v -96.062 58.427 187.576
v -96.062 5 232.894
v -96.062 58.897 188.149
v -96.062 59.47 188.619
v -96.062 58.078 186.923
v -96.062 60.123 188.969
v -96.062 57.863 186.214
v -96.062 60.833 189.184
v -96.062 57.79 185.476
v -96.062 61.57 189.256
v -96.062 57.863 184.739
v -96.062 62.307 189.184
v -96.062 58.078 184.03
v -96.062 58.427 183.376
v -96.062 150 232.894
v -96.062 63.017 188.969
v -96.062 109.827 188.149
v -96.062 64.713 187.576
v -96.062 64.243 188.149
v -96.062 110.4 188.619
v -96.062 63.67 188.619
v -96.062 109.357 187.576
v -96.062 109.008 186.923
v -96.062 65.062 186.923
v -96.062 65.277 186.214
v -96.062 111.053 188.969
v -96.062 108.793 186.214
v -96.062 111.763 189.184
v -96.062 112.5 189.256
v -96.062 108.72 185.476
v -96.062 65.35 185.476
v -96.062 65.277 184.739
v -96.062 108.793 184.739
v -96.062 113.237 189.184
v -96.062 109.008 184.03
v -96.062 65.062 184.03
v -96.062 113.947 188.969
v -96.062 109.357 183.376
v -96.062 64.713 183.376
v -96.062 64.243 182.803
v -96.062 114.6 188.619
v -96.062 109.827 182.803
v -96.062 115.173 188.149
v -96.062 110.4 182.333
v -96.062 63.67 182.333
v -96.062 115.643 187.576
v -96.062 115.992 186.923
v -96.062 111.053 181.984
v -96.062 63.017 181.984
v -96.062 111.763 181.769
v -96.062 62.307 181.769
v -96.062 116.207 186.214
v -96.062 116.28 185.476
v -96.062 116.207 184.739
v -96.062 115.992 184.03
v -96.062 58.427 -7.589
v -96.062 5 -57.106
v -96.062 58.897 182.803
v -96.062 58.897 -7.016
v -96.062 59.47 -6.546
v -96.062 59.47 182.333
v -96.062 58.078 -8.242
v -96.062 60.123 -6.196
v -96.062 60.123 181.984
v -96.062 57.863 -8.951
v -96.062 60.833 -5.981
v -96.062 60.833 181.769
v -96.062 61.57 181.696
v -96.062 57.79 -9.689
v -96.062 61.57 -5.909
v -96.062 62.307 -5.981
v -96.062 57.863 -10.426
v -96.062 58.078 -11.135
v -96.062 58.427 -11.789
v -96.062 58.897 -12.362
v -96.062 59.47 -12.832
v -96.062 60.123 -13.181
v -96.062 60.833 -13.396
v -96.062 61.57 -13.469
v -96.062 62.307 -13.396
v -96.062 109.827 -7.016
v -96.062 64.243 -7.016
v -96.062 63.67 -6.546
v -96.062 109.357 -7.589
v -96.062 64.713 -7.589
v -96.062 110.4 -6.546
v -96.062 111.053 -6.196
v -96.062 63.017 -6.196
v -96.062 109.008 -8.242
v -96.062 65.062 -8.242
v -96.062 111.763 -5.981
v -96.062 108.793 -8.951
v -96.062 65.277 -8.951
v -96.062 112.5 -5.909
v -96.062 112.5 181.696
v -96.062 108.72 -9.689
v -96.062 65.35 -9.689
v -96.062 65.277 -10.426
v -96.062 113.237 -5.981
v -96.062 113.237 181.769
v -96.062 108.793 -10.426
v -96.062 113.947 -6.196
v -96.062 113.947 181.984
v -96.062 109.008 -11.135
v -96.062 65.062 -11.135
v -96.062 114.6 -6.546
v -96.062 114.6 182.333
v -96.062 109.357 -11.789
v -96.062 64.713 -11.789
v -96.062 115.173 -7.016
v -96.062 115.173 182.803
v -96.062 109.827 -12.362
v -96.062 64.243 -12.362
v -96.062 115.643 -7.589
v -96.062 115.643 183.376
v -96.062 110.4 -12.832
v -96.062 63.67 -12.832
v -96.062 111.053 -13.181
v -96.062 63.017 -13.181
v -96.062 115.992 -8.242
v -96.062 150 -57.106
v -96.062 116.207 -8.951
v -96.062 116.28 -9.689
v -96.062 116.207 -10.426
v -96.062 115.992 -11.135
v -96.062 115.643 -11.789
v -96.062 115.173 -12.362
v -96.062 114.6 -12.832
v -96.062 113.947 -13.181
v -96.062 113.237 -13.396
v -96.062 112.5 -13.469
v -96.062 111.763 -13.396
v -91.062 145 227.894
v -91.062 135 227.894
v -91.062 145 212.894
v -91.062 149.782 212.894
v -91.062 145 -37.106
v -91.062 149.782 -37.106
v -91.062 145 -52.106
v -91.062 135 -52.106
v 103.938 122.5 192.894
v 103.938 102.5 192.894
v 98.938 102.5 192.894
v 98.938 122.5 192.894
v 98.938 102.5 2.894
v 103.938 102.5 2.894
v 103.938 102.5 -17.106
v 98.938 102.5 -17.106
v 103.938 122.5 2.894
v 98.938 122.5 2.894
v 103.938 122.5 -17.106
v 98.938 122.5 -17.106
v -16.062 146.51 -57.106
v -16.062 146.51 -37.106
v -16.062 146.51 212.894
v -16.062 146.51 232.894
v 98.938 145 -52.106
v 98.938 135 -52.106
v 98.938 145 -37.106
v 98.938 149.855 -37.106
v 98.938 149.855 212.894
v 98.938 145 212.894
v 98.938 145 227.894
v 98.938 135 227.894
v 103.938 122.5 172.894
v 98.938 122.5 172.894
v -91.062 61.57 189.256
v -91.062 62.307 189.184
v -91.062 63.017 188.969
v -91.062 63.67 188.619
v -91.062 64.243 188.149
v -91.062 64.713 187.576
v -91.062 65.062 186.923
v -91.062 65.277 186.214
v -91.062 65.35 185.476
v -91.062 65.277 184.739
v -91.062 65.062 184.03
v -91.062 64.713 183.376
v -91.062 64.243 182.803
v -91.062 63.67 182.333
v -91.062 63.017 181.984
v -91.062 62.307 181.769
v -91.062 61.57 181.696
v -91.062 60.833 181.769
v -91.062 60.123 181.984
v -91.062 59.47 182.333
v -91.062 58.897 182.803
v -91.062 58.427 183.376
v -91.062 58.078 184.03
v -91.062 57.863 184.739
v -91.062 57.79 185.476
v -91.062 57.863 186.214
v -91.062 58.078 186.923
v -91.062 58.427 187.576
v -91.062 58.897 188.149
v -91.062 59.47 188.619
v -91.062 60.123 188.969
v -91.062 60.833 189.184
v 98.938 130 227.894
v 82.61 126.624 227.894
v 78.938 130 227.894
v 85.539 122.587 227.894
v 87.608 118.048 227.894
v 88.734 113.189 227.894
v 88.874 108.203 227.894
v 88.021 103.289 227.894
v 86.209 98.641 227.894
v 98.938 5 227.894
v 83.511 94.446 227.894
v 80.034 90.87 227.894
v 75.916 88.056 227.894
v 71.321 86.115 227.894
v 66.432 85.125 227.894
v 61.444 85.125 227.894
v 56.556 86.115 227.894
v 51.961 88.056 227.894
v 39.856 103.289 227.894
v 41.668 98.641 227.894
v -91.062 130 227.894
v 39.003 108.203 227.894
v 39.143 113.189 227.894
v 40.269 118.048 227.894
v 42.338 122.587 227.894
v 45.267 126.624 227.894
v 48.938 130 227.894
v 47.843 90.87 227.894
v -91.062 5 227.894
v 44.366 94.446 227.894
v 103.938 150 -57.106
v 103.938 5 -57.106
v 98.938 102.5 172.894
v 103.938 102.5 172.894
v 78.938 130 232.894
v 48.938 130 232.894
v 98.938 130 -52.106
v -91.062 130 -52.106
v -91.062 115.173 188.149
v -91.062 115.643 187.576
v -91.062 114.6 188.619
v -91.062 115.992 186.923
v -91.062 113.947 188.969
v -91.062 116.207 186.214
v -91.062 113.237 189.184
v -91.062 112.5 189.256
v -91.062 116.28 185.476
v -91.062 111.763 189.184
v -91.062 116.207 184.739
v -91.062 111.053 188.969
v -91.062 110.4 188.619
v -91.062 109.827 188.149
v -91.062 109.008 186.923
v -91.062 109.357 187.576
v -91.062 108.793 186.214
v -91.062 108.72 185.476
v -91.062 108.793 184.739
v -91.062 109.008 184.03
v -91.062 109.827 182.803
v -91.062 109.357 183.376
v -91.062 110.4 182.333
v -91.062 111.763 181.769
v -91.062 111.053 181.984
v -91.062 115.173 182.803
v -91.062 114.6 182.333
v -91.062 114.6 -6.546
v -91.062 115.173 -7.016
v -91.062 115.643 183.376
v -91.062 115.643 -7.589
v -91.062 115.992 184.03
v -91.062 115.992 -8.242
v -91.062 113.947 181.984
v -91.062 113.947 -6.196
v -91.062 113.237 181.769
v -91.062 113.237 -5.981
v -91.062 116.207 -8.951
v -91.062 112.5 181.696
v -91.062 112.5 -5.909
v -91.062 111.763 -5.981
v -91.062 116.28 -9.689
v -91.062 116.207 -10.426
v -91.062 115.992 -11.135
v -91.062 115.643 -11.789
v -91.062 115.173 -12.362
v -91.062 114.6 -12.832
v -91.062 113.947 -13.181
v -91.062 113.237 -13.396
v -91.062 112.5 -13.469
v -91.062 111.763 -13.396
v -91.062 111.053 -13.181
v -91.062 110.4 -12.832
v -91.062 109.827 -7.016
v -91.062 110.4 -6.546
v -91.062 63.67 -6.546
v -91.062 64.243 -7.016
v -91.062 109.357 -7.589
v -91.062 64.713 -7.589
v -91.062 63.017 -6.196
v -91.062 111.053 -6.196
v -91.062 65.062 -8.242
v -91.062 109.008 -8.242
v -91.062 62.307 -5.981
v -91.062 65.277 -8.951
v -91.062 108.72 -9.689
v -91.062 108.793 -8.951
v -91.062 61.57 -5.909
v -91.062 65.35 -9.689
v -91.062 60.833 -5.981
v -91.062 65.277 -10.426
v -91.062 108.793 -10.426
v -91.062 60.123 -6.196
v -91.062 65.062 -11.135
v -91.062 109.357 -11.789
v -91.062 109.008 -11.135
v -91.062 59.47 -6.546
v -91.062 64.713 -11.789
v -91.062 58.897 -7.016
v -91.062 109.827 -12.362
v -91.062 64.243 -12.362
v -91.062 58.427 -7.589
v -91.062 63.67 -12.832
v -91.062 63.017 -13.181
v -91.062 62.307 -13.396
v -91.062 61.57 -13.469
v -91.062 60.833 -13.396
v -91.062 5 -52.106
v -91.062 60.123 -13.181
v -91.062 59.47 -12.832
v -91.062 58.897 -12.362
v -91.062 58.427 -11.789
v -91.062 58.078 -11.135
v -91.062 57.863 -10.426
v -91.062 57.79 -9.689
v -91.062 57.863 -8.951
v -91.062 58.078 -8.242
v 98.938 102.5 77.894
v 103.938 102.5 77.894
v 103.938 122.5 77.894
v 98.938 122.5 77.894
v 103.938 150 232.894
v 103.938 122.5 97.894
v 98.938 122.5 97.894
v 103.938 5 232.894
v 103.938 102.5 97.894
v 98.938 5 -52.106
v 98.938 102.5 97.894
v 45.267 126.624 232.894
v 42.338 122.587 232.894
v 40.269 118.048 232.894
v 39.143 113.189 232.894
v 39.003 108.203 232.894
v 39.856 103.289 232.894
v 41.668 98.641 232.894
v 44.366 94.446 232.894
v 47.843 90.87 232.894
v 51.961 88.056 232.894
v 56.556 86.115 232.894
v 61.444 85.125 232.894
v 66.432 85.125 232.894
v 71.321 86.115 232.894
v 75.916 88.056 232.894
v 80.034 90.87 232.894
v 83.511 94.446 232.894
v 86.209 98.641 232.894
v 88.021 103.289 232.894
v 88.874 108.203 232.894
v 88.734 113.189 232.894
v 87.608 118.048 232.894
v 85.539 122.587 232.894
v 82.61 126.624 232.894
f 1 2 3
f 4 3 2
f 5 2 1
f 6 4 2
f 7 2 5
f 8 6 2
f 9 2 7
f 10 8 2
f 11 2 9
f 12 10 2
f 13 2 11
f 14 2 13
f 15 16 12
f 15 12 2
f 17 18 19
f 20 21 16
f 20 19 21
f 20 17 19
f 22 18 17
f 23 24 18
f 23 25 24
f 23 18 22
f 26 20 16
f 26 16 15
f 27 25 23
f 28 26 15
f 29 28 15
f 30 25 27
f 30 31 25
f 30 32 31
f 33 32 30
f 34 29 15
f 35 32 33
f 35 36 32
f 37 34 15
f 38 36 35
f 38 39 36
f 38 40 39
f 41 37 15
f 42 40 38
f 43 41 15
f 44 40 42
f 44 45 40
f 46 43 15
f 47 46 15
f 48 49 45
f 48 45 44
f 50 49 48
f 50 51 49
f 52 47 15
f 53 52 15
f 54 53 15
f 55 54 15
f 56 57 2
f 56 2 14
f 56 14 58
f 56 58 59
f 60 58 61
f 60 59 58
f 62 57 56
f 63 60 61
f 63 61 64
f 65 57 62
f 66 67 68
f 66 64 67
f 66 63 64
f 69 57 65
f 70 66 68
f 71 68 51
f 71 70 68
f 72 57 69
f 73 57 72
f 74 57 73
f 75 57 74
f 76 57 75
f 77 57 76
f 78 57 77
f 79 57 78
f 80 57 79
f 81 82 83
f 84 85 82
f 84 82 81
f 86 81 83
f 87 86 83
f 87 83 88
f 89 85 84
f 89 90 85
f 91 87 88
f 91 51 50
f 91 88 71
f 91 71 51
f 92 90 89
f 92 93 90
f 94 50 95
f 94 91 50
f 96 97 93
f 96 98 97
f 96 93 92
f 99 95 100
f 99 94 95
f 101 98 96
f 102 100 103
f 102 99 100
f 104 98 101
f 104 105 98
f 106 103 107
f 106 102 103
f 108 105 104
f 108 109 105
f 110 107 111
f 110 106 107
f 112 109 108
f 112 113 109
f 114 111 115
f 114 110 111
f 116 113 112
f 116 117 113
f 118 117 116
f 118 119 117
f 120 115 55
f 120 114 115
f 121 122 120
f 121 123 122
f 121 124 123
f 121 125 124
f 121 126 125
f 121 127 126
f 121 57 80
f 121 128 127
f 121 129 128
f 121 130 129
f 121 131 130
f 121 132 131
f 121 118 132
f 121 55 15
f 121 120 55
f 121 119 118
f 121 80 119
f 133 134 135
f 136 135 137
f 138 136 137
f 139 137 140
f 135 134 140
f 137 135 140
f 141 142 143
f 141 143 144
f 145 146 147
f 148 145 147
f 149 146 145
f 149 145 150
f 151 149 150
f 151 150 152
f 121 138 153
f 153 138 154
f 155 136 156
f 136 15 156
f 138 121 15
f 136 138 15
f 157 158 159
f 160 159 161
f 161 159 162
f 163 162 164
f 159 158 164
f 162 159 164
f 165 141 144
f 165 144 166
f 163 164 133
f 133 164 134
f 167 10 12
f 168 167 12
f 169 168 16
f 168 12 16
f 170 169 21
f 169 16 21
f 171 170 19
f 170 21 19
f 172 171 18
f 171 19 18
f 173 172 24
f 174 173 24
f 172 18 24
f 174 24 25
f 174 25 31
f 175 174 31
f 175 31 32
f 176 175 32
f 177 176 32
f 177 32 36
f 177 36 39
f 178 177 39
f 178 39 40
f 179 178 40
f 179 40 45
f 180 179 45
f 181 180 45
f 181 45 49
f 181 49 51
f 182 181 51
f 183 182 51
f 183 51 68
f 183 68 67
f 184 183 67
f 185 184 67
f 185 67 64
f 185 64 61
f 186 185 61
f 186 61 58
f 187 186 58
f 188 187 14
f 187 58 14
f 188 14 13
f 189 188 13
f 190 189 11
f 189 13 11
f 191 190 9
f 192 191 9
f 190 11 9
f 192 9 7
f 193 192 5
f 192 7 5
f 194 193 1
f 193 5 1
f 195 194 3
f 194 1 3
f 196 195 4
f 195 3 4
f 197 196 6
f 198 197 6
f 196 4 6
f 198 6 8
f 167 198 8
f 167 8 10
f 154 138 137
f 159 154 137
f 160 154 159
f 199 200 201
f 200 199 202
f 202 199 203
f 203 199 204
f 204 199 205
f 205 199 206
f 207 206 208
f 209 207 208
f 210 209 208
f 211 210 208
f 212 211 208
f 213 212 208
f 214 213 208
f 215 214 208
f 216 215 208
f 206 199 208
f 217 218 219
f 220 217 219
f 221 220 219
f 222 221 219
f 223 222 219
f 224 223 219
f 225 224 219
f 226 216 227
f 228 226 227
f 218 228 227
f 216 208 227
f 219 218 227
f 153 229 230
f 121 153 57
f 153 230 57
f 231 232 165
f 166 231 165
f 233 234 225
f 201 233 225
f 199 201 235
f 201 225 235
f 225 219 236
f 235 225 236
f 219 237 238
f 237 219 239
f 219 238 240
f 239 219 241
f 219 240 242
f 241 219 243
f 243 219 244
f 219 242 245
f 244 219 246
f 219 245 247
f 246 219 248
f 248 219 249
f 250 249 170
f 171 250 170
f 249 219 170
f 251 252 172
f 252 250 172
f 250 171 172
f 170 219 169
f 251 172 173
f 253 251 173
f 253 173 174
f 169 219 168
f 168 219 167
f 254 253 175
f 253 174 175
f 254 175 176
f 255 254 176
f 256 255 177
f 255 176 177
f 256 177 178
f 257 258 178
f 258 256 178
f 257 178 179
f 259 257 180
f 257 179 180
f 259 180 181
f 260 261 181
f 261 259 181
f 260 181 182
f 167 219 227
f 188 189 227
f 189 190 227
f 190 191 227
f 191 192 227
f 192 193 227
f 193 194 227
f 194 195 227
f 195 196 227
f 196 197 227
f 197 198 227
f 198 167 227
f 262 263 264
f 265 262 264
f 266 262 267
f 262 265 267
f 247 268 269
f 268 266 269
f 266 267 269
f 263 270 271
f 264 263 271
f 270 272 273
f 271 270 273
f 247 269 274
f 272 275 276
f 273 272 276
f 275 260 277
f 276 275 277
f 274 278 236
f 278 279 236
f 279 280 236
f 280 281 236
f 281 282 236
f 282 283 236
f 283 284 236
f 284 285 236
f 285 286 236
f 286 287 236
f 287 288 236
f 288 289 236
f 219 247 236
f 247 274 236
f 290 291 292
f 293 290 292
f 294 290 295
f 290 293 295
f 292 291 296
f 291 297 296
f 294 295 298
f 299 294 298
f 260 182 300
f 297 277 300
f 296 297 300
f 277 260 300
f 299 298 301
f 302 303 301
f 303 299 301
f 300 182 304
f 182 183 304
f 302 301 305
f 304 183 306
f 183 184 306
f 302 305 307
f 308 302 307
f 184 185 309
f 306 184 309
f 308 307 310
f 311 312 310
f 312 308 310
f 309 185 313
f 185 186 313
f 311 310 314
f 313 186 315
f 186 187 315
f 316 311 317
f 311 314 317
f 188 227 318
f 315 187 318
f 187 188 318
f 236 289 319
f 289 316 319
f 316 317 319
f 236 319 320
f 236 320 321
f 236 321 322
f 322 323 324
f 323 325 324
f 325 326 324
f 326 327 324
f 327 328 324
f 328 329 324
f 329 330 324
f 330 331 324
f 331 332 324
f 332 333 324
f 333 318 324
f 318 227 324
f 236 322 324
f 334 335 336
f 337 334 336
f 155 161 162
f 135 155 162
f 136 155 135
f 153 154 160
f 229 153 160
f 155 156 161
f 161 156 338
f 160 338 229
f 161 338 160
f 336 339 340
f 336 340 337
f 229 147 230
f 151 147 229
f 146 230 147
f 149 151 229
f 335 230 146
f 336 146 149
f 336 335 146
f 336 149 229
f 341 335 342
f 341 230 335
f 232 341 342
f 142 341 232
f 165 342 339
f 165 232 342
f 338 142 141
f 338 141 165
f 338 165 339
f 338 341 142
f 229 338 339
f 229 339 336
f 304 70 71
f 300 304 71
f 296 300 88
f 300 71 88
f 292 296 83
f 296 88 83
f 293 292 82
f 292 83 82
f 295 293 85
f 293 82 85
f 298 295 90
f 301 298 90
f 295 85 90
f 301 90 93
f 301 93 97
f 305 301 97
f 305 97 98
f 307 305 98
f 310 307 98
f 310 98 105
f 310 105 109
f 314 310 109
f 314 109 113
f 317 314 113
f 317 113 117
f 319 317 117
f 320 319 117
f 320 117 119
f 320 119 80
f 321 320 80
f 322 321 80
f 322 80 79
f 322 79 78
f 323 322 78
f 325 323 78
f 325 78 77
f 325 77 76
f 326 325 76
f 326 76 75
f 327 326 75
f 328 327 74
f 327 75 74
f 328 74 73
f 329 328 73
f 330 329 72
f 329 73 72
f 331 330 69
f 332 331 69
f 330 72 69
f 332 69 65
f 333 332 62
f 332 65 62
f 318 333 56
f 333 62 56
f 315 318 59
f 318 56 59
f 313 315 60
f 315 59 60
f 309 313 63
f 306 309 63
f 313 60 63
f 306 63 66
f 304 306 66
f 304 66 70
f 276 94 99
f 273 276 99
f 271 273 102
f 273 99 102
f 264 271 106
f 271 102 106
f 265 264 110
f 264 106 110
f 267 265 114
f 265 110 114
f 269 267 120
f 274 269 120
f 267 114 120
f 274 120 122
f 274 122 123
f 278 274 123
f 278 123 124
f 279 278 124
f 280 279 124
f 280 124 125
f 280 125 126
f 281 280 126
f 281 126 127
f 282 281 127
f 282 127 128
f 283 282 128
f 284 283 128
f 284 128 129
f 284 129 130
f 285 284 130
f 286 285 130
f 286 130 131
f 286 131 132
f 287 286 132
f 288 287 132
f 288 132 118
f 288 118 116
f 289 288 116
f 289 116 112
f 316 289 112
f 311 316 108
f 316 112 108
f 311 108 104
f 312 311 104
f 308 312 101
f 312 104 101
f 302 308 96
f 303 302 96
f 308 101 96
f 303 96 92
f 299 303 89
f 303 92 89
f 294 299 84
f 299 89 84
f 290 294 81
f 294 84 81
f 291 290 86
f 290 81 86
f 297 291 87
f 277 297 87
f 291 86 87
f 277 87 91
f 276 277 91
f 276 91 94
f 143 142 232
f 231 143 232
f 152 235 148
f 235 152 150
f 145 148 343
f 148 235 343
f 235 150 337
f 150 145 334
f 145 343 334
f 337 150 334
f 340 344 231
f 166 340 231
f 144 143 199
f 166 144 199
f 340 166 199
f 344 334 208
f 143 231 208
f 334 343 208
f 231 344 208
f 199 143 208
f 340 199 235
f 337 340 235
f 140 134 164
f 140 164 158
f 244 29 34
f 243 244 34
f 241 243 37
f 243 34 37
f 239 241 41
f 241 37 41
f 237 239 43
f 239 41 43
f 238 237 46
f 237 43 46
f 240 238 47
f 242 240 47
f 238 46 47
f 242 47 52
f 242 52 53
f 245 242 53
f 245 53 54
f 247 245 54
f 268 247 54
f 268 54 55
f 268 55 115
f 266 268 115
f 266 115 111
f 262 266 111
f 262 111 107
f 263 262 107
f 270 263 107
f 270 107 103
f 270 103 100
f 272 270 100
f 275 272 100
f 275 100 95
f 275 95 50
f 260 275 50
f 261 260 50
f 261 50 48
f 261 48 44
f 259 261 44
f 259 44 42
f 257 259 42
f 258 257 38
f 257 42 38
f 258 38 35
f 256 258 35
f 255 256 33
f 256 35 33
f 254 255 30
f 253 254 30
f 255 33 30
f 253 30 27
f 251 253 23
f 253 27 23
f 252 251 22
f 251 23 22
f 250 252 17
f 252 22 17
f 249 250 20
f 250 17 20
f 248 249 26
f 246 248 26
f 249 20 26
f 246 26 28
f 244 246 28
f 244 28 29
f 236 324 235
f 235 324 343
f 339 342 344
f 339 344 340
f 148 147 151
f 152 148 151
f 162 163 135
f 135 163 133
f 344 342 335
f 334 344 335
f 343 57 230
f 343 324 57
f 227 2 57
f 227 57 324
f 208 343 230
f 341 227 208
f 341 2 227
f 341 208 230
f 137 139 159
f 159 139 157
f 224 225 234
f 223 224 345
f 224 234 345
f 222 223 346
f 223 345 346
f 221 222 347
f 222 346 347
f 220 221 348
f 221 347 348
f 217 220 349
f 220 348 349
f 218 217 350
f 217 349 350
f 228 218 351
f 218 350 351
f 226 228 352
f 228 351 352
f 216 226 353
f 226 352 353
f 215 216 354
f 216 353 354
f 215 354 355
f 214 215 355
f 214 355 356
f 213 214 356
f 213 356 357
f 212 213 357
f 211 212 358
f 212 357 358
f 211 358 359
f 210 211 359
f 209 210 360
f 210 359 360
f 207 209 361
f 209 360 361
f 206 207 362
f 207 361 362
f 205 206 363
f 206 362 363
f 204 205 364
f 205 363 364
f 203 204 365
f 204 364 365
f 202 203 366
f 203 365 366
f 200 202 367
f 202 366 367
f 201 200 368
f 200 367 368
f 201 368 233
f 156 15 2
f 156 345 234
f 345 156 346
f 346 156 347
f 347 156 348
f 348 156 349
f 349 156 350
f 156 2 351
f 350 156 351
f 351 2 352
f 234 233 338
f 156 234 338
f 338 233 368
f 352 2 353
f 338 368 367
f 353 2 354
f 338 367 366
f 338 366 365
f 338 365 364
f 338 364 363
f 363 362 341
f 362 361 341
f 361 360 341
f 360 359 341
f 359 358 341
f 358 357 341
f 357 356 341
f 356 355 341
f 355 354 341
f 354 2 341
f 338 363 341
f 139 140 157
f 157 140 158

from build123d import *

# Parameters (mm, degrees)
SKETCH1_W            = 200
SKETCH1_H            = 290
BOSS_EXTRUDE2_DEPTH  = 10
BOSS_EXTRUDE4_DEPTH  = 140
SKETCH5_W            = 20
SKETCH5_H            = 20
CUT_EXTRUDE1_DEPTH   = 10
SKETCH6_R            = 3.78
CUT_EXTRUDE2_DEPTH   = 10
SKETCH7_R            = 25
CUT_EXTRUDE3_DEPTH   = 10
SKETCH8_W            = 190
SKETCH8_H            = 280
CUT_EXTRUDE4_DEPTH   = 10
SKETCH9_W            = 211.457715155
SKETCH9_H            = 301.376650104
CUT_EXTRUDE5_DEPTH   = 5
SKETCH10_W           = 200
SKETCH10_H           = 5
BOSS_EXTRUDE7_DEPTH  = 15
SKETCH12_W           = 200
SKETCH12_H           = 5
BOSS_EXTRUDE8_DEPTH  = 15
SKETCH13_W           = 290
SKETCH13_H           = 5
BOSS_EXTRUDE14_DEPTH = 190
CUT_EXTRUDE6_DEPTH   = 300


with BuildPart() as part:
    # Sketch1 → Boss-Extrude2 (new body)
    with BuildSketch(Plane(origin=(0, 0, 0), x_dir=(1, 0, 0), z_dir=(0, 1, 0))):
        with Locations((3.938356164, -87.893835616)):
            Rectangle(SKETCH1_W, SKETCH1_H)
    extrude(amount=BOSS_EXTRUDE2_DEPTH)

    # Sketch2 → Boss-Extrude4 (add)
    with BuildSketch(Plane(origin=(0, 10, 0), x_dir=(1, 0, 0), z_dir=(0, 1, 0))):
        Polygon((-96.061643836, 57.106164384), (-96.061643836, -87.893835616), (-91.061643836, -87.893835616), (-91.061643836, 52.106164384), (3.938356164, 52.106164384), (3.938356164, 57.106164384), align=None)
        Polygon((103.938356164, 57.106164384), (3.938356164, 57.106164384), (3.938356164, 52.106164384), (98.938356164, 52.106164384), (98.938356164, -87.893835616), (103.938356164, -87.893835616), align=None)
        Polygon((3.938356164, -227.893835616), (3.938356164, -232.893835616), (103.938356164, -232.893835616), (103.938356164, -87.893835616), (98.938356164, -87.893835616), (98.938356164, -227.893835616), align=None)
        Polygon((-91.061643836, -87.893835616), (-96.061643836, -87.893835616), (-96.061643836, -232.893835616), (3.938356164, -232.893835616), (3.938356164, -227.893835616), (-91.061643836, -227.893835616), align=None)
    extrude(amount=BOSS_EXTRUDE4_DEPTH)

    # Sketch5 → Cut-Extrude1 (cut)
    with BuildSketch(Plane(origin=(103.938356164, 0, 0), x_dir=(0, 0, -1), z_dir=(1, 0, 0))):
        with Locations((-182.893835616, 112.5)):
            Rectangle(SKETCH5_W, SKETCH5_H)
        with Locations((-87.893835616, 112.5)):
            Rectangle(SKETCH5_W, SKETCH5_H)
        with Locations((7.106164384, 112.5)):
            Rectangle(SKETCH5_W, SKETCH5_H)
    extrude(amount=-CUT_EXTRUDE1_DEPTH, mode=Mode.SUBTRACT)

    # Sketch6 → Cut-Extrude2 (cut)
    with BuildSketch(Plane.ZY.offset(96.061643836)):
        with Locations((185.476335616, 112.5)):
            Circle(SKETCH6_R)
        with Locations((-9.688664384, 112.5)):
            Circle(SKETCH6_R)
        with Locations((185.476335616, 61.57)):
            Circle(SKETCH6_R)
        with Locations((-9.688664384, 61.57)):
            Circle(SKETCH6_R)
    extrude(amount=-CUT_EXTRUDE2_DEPTH, mode=Mode.SUBTRACT)

    # Sketch7 → Cut-Extrude3 (cut)
    with BuildSketch(Plane.XY.offset(232.893835616)):
        with Locations((63.938356164, 110)):
            Circle(SKETCH7_R)
    extrude(amount=-CUT_EXTRUDE3_DEPTH, mode=Mode.SUBTRACT)

    # Sketch8 → Cut-Extrude4 (cut)
    with BuildSketch(Plane(origin=(0, 10, 0), x_dir=(1, 0, 0), z_dir=(0, 1, 0))):
        with Locations((3.938356164, -87.893835616)):
            Rectangle(SKETCH8_W, SKETCH8_H)
    extrude(amount=-CUT_EXTRUDE4_DEPTH, mode=Mode.SUBTRACT)

    # Sketch9 → Cut-Extrude5 (cut)
    with BuildSketch(Plane.XZ):
        with Locations((3.40694666, 89.005470801)):
            Rectangle(SKETCH9_W, SKETCH9_H)
    extrude(amount=-CUT_EXTRUDE5_DEPTH, mode=Mode.SUBTRACT)

    # Sketch10 → Boss-Extrude7 (add)
    with BuildSketch(Plane(origin=(0, 0, 227.893835616), x_dir=(-1, 0, 0), z_dir=(0, 0, -1))):
        with Locations((-3.938356164, 147.5)):
            Rectangle(SKETCH10_W, SKETCH10_H)
    extrude(amount=BOSS_EXTRUDE7_DEPTH)

    # Sketch12 → Boss-Extrude8 (add)
    with BuildSketch(Plane.XY.offset(-52.106164384)):
        with Locations((3.938356164, 147.5)):
            Rectangle(SKETCH12_W, SKETCH12_H)
    extrude(amount=BOSS_EXTRUDE8_DEPTH)

    # Sketch13 → Boss-Extrude14 (add)
    with BuildSketch(Plane(origin=(-91.061643836, 0, 0), x_dir=(0, 0, -1), z_dir=(1, 0, 0))):
        with Locations((-87.893835616, 132.5)):
            Rectangle(SKETCH13_W, SKETCH13_H)
    extrude(amount=BOSS_EXTRUDE14_DEPTH)

    # Sketch17 → Cut-Extrude6 (cut)
    with BuildSketch(Plane.XY.offset(232.893835616)):
        Polygon((-16.061643836, 150), (-96.061643836, 150), (-16.061643836, 146.51), align=None)
        Polygon((103.938356164, 150), (-16.061643836, 150), (-16.061643836, 146.51), align=None)
    extrude(amount=-CUT_EXTRUDE6_DEPTH, mode=Mode.SUBTRACT)


solid = part.part
